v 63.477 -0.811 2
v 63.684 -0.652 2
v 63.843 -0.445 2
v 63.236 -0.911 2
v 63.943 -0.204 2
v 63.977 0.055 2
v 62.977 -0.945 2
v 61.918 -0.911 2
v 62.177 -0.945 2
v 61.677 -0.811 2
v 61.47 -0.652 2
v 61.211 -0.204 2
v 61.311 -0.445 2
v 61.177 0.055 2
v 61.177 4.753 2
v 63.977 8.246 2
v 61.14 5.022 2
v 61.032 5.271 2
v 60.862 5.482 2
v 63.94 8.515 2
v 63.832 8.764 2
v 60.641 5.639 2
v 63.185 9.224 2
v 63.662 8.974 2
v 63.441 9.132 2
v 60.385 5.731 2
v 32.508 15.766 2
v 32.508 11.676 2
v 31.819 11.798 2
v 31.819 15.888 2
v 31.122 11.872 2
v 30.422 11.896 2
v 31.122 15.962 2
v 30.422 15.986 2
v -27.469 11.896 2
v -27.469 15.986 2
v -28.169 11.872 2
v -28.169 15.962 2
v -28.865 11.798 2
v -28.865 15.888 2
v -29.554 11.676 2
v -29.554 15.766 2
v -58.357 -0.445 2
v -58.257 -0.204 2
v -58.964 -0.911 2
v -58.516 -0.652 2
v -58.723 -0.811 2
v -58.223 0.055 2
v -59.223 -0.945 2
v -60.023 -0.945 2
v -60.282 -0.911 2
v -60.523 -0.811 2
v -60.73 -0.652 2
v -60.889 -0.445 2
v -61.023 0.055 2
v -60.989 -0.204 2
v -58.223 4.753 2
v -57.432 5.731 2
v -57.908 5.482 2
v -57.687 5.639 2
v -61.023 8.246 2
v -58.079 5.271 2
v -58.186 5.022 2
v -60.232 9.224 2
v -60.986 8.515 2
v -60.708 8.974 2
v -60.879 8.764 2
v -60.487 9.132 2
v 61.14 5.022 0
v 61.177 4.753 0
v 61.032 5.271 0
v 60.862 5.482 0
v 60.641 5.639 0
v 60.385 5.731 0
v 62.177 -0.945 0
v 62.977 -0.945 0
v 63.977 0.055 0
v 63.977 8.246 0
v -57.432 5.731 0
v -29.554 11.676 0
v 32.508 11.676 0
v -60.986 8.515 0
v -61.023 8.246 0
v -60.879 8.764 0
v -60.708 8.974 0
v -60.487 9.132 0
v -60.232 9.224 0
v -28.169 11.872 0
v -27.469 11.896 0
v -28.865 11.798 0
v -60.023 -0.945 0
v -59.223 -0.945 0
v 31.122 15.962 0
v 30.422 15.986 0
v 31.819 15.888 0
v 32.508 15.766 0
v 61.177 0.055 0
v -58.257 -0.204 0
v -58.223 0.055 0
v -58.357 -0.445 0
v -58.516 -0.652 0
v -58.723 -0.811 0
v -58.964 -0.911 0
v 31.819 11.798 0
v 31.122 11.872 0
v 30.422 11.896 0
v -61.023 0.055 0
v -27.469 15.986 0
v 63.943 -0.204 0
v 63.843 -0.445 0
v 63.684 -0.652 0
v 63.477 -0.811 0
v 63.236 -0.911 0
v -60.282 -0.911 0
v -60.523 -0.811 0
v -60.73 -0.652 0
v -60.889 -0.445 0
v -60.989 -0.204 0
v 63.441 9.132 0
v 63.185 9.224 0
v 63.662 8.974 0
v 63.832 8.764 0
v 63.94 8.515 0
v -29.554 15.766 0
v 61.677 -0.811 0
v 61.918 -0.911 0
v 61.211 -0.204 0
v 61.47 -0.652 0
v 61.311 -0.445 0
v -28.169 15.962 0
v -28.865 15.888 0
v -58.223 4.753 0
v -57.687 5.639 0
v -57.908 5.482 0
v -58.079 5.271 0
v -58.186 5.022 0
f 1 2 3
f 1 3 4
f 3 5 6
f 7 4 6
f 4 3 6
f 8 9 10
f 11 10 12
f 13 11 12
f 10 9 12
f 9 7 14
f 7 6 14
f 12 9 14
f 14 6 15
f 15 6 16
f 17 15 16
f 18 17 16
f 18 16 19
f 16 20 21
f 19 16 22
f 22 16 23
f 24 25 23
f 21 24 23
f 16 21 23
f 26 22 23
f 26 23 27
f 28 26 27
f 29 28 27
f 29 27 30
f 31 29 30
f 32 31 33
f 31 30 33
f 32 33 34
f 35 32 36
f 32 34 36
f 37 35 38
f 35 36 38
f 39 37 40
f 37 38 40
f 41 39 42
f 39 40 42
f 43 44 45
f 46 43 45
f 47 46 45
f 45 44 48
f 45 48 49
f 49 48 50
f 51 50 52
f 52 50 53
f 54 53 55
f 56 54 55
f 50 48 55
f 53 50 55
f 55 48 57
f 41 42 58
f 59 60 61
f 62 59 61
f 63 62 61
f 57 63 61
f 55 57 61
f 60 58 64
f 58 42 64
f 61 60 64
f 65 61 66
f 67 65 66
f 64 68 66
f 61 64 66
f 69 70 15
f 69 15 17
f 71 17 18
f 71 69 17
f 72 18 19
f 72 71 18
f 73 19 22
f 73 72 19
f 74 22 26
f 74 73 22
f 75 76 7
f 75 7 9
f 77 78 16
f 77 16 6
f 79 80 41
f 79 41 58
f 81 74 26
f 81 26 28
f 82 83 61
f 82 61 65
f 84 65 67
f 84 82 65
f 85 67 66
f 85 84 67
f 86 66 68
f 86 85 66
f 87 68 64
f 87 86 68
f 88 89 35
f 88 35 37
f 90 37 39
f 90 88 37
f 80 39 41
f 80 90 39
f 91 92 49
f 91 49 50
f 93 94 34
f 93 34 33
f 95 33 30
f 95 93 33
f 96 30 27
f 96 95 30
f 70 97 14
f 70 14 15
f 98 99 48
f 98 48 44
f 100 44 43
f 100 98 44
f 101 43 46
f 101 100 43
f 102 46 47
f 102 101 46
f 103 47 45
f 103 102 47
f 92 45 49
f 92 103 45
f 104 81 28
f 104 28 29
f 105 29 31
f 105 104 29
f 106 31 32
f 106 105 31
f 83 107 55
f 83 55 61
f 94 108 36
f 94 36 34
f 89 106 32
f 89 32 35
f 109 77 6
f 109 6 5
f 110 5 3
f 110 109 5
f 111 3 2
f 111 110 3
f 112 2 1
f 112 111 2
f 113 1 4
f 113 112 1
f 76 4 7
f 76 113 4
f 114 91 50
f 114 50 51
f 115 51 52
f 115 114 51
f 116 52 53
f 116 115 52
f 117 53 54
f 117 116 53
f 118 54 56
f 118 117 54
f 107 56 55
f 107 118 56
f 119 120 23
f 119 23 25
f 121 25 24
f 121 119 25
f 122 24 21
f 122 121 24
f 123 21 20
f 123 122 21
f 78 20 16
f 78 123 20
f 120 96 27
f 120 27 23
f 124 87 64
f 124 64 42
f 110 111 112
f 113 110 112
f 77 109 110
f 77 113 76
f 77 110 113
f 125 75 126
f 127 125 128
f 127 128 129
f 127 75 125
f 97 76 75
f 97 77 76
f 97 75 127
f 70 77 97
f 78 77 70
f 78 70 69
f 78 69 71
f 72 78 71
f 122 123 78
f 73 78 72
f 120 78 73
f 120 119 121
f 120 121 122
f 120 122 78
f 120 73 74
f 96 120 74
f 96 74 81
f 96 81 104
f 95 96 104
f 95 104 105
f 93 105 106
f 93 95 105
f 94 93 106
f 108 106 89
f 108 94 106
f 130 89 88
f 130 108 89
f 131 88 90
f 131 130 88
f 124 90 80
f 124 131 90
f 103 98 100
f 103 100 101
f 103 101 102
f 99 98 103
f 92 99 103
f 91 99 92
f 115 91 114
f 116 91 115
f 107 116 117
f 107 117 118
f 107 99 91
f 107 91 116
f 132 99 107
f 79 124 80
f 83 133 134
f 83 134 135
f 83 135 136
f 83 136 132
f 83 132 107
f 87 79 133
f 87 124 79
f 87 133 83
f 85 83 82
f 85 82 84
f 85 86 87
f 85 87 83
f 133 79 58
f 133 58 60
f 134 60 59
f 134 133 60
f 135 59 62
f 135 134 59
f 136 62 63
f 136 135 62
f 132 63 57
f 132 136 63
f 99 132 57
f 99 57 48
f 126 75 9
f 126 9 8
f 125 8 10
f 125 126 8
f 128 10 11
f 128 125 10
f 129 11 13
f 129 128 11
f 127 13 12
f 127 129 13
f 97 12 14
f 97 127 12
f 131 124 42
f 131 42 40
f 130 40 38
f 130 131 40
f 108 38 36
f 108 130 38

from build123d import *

# Parameters (mm, degrees)
SALIENTE_EXTRUIR1_DEPTH = 2


with BuildPart() as part:
    # Croquis1 → Saliente-Extruir1 (new body)
    with BuildSketch(Plane.XY):
        with BuildLine():
            Line((-27.468702439, 15.986263571), (30.422317404, 15.986263571))
            ThreePointArc((30.422317404, 15.986263571), (31.470993229, 15.931125511), (32.508104664, 15.766319374))
            Line((32.508104664, 15.766319374), (63.185386208, 9.223791978))
            ThreePointArc((63.185386208, 9.223791978), (63.754167993, 8.874841751), (63.976807482, 8.245786398))
            Line((63.976807482, 8.245786398), (63.976807482, 0.055005987))
            ThreePointArc((63.976807482, 0.055005987), (63.683914264, -0.652100794), (62.976807482, -0.944994013))
            Line((62.976807482, -0.944994013), (62.176807482, -0.944994013))
            ThreePointArc((62.176807482, -0.944994013), (61.469700701, -0.652100794), (61.176807482, 0.055005987))
            Line((61.176807482, 0.055005987), (61.176807482, 4.752984684))
            ThreePointArc((61.176807482, 4.752984684), (60.954167993, 5.382040037), (60.385386208, 5.730990264))
            Line((60.385386208, 5.730990264), (32.508104664, 11.67636316))
            ThreePointArc((32.508104664, 11.67636316), (31.470993229, 11.841169298), (30.422317404, 11.896307357))
            Line((30.422317404, 11.896307357), (-27.468702439, 11.896307357))
            ThreePointArc((-27.468702439, 11.896307357), (-28.517378264, 11.841169298), (-29.554489699, 11.67636316))
            Line((-29.554489699, 11.67636316), (-57.431771244, 5.730990264))
            ThreePointArc((-57.431771244, 5.730990264), (-58.000553028, 5.382040037), (-58.223192518, 4.752984684))
            Line((-58.223192518, 4.752984684), (-58.223192518, 0.055005987))
            ThreePointArc((-58.223192518, 0.055005987), (-58.516085736, -0.652100794), (-59.223192518, -0.944994013))
            Line((-59.223192518, -0.944994013), (-60.023192518, -0.944994013))
            ThreePointArc((-60.023192518, -0.944994013), (-60.730299299, -0.652100794), (-61.023192518, 0.055005987))
            Line((-61.023192518, 0.055005987), (-61.023192518, 8.245786398))
            ThreePointArc((-61.023192518, 8.245786398), (-60.800553028, 8.874841751), (-60.231771244, 9.223791978))
            Line((-60.231771244, 9.223791978), (-29.554489699, 15.766319374))
            ThreePointArc((-29.554489699, 15.766319374), (-28.517378264, 15.931125511), (-27.468702439, 15.986263571))
        make_face()
    extrude(amount=SALIENTE_EXTRUIR1_DEPTH)


solid = part.part
